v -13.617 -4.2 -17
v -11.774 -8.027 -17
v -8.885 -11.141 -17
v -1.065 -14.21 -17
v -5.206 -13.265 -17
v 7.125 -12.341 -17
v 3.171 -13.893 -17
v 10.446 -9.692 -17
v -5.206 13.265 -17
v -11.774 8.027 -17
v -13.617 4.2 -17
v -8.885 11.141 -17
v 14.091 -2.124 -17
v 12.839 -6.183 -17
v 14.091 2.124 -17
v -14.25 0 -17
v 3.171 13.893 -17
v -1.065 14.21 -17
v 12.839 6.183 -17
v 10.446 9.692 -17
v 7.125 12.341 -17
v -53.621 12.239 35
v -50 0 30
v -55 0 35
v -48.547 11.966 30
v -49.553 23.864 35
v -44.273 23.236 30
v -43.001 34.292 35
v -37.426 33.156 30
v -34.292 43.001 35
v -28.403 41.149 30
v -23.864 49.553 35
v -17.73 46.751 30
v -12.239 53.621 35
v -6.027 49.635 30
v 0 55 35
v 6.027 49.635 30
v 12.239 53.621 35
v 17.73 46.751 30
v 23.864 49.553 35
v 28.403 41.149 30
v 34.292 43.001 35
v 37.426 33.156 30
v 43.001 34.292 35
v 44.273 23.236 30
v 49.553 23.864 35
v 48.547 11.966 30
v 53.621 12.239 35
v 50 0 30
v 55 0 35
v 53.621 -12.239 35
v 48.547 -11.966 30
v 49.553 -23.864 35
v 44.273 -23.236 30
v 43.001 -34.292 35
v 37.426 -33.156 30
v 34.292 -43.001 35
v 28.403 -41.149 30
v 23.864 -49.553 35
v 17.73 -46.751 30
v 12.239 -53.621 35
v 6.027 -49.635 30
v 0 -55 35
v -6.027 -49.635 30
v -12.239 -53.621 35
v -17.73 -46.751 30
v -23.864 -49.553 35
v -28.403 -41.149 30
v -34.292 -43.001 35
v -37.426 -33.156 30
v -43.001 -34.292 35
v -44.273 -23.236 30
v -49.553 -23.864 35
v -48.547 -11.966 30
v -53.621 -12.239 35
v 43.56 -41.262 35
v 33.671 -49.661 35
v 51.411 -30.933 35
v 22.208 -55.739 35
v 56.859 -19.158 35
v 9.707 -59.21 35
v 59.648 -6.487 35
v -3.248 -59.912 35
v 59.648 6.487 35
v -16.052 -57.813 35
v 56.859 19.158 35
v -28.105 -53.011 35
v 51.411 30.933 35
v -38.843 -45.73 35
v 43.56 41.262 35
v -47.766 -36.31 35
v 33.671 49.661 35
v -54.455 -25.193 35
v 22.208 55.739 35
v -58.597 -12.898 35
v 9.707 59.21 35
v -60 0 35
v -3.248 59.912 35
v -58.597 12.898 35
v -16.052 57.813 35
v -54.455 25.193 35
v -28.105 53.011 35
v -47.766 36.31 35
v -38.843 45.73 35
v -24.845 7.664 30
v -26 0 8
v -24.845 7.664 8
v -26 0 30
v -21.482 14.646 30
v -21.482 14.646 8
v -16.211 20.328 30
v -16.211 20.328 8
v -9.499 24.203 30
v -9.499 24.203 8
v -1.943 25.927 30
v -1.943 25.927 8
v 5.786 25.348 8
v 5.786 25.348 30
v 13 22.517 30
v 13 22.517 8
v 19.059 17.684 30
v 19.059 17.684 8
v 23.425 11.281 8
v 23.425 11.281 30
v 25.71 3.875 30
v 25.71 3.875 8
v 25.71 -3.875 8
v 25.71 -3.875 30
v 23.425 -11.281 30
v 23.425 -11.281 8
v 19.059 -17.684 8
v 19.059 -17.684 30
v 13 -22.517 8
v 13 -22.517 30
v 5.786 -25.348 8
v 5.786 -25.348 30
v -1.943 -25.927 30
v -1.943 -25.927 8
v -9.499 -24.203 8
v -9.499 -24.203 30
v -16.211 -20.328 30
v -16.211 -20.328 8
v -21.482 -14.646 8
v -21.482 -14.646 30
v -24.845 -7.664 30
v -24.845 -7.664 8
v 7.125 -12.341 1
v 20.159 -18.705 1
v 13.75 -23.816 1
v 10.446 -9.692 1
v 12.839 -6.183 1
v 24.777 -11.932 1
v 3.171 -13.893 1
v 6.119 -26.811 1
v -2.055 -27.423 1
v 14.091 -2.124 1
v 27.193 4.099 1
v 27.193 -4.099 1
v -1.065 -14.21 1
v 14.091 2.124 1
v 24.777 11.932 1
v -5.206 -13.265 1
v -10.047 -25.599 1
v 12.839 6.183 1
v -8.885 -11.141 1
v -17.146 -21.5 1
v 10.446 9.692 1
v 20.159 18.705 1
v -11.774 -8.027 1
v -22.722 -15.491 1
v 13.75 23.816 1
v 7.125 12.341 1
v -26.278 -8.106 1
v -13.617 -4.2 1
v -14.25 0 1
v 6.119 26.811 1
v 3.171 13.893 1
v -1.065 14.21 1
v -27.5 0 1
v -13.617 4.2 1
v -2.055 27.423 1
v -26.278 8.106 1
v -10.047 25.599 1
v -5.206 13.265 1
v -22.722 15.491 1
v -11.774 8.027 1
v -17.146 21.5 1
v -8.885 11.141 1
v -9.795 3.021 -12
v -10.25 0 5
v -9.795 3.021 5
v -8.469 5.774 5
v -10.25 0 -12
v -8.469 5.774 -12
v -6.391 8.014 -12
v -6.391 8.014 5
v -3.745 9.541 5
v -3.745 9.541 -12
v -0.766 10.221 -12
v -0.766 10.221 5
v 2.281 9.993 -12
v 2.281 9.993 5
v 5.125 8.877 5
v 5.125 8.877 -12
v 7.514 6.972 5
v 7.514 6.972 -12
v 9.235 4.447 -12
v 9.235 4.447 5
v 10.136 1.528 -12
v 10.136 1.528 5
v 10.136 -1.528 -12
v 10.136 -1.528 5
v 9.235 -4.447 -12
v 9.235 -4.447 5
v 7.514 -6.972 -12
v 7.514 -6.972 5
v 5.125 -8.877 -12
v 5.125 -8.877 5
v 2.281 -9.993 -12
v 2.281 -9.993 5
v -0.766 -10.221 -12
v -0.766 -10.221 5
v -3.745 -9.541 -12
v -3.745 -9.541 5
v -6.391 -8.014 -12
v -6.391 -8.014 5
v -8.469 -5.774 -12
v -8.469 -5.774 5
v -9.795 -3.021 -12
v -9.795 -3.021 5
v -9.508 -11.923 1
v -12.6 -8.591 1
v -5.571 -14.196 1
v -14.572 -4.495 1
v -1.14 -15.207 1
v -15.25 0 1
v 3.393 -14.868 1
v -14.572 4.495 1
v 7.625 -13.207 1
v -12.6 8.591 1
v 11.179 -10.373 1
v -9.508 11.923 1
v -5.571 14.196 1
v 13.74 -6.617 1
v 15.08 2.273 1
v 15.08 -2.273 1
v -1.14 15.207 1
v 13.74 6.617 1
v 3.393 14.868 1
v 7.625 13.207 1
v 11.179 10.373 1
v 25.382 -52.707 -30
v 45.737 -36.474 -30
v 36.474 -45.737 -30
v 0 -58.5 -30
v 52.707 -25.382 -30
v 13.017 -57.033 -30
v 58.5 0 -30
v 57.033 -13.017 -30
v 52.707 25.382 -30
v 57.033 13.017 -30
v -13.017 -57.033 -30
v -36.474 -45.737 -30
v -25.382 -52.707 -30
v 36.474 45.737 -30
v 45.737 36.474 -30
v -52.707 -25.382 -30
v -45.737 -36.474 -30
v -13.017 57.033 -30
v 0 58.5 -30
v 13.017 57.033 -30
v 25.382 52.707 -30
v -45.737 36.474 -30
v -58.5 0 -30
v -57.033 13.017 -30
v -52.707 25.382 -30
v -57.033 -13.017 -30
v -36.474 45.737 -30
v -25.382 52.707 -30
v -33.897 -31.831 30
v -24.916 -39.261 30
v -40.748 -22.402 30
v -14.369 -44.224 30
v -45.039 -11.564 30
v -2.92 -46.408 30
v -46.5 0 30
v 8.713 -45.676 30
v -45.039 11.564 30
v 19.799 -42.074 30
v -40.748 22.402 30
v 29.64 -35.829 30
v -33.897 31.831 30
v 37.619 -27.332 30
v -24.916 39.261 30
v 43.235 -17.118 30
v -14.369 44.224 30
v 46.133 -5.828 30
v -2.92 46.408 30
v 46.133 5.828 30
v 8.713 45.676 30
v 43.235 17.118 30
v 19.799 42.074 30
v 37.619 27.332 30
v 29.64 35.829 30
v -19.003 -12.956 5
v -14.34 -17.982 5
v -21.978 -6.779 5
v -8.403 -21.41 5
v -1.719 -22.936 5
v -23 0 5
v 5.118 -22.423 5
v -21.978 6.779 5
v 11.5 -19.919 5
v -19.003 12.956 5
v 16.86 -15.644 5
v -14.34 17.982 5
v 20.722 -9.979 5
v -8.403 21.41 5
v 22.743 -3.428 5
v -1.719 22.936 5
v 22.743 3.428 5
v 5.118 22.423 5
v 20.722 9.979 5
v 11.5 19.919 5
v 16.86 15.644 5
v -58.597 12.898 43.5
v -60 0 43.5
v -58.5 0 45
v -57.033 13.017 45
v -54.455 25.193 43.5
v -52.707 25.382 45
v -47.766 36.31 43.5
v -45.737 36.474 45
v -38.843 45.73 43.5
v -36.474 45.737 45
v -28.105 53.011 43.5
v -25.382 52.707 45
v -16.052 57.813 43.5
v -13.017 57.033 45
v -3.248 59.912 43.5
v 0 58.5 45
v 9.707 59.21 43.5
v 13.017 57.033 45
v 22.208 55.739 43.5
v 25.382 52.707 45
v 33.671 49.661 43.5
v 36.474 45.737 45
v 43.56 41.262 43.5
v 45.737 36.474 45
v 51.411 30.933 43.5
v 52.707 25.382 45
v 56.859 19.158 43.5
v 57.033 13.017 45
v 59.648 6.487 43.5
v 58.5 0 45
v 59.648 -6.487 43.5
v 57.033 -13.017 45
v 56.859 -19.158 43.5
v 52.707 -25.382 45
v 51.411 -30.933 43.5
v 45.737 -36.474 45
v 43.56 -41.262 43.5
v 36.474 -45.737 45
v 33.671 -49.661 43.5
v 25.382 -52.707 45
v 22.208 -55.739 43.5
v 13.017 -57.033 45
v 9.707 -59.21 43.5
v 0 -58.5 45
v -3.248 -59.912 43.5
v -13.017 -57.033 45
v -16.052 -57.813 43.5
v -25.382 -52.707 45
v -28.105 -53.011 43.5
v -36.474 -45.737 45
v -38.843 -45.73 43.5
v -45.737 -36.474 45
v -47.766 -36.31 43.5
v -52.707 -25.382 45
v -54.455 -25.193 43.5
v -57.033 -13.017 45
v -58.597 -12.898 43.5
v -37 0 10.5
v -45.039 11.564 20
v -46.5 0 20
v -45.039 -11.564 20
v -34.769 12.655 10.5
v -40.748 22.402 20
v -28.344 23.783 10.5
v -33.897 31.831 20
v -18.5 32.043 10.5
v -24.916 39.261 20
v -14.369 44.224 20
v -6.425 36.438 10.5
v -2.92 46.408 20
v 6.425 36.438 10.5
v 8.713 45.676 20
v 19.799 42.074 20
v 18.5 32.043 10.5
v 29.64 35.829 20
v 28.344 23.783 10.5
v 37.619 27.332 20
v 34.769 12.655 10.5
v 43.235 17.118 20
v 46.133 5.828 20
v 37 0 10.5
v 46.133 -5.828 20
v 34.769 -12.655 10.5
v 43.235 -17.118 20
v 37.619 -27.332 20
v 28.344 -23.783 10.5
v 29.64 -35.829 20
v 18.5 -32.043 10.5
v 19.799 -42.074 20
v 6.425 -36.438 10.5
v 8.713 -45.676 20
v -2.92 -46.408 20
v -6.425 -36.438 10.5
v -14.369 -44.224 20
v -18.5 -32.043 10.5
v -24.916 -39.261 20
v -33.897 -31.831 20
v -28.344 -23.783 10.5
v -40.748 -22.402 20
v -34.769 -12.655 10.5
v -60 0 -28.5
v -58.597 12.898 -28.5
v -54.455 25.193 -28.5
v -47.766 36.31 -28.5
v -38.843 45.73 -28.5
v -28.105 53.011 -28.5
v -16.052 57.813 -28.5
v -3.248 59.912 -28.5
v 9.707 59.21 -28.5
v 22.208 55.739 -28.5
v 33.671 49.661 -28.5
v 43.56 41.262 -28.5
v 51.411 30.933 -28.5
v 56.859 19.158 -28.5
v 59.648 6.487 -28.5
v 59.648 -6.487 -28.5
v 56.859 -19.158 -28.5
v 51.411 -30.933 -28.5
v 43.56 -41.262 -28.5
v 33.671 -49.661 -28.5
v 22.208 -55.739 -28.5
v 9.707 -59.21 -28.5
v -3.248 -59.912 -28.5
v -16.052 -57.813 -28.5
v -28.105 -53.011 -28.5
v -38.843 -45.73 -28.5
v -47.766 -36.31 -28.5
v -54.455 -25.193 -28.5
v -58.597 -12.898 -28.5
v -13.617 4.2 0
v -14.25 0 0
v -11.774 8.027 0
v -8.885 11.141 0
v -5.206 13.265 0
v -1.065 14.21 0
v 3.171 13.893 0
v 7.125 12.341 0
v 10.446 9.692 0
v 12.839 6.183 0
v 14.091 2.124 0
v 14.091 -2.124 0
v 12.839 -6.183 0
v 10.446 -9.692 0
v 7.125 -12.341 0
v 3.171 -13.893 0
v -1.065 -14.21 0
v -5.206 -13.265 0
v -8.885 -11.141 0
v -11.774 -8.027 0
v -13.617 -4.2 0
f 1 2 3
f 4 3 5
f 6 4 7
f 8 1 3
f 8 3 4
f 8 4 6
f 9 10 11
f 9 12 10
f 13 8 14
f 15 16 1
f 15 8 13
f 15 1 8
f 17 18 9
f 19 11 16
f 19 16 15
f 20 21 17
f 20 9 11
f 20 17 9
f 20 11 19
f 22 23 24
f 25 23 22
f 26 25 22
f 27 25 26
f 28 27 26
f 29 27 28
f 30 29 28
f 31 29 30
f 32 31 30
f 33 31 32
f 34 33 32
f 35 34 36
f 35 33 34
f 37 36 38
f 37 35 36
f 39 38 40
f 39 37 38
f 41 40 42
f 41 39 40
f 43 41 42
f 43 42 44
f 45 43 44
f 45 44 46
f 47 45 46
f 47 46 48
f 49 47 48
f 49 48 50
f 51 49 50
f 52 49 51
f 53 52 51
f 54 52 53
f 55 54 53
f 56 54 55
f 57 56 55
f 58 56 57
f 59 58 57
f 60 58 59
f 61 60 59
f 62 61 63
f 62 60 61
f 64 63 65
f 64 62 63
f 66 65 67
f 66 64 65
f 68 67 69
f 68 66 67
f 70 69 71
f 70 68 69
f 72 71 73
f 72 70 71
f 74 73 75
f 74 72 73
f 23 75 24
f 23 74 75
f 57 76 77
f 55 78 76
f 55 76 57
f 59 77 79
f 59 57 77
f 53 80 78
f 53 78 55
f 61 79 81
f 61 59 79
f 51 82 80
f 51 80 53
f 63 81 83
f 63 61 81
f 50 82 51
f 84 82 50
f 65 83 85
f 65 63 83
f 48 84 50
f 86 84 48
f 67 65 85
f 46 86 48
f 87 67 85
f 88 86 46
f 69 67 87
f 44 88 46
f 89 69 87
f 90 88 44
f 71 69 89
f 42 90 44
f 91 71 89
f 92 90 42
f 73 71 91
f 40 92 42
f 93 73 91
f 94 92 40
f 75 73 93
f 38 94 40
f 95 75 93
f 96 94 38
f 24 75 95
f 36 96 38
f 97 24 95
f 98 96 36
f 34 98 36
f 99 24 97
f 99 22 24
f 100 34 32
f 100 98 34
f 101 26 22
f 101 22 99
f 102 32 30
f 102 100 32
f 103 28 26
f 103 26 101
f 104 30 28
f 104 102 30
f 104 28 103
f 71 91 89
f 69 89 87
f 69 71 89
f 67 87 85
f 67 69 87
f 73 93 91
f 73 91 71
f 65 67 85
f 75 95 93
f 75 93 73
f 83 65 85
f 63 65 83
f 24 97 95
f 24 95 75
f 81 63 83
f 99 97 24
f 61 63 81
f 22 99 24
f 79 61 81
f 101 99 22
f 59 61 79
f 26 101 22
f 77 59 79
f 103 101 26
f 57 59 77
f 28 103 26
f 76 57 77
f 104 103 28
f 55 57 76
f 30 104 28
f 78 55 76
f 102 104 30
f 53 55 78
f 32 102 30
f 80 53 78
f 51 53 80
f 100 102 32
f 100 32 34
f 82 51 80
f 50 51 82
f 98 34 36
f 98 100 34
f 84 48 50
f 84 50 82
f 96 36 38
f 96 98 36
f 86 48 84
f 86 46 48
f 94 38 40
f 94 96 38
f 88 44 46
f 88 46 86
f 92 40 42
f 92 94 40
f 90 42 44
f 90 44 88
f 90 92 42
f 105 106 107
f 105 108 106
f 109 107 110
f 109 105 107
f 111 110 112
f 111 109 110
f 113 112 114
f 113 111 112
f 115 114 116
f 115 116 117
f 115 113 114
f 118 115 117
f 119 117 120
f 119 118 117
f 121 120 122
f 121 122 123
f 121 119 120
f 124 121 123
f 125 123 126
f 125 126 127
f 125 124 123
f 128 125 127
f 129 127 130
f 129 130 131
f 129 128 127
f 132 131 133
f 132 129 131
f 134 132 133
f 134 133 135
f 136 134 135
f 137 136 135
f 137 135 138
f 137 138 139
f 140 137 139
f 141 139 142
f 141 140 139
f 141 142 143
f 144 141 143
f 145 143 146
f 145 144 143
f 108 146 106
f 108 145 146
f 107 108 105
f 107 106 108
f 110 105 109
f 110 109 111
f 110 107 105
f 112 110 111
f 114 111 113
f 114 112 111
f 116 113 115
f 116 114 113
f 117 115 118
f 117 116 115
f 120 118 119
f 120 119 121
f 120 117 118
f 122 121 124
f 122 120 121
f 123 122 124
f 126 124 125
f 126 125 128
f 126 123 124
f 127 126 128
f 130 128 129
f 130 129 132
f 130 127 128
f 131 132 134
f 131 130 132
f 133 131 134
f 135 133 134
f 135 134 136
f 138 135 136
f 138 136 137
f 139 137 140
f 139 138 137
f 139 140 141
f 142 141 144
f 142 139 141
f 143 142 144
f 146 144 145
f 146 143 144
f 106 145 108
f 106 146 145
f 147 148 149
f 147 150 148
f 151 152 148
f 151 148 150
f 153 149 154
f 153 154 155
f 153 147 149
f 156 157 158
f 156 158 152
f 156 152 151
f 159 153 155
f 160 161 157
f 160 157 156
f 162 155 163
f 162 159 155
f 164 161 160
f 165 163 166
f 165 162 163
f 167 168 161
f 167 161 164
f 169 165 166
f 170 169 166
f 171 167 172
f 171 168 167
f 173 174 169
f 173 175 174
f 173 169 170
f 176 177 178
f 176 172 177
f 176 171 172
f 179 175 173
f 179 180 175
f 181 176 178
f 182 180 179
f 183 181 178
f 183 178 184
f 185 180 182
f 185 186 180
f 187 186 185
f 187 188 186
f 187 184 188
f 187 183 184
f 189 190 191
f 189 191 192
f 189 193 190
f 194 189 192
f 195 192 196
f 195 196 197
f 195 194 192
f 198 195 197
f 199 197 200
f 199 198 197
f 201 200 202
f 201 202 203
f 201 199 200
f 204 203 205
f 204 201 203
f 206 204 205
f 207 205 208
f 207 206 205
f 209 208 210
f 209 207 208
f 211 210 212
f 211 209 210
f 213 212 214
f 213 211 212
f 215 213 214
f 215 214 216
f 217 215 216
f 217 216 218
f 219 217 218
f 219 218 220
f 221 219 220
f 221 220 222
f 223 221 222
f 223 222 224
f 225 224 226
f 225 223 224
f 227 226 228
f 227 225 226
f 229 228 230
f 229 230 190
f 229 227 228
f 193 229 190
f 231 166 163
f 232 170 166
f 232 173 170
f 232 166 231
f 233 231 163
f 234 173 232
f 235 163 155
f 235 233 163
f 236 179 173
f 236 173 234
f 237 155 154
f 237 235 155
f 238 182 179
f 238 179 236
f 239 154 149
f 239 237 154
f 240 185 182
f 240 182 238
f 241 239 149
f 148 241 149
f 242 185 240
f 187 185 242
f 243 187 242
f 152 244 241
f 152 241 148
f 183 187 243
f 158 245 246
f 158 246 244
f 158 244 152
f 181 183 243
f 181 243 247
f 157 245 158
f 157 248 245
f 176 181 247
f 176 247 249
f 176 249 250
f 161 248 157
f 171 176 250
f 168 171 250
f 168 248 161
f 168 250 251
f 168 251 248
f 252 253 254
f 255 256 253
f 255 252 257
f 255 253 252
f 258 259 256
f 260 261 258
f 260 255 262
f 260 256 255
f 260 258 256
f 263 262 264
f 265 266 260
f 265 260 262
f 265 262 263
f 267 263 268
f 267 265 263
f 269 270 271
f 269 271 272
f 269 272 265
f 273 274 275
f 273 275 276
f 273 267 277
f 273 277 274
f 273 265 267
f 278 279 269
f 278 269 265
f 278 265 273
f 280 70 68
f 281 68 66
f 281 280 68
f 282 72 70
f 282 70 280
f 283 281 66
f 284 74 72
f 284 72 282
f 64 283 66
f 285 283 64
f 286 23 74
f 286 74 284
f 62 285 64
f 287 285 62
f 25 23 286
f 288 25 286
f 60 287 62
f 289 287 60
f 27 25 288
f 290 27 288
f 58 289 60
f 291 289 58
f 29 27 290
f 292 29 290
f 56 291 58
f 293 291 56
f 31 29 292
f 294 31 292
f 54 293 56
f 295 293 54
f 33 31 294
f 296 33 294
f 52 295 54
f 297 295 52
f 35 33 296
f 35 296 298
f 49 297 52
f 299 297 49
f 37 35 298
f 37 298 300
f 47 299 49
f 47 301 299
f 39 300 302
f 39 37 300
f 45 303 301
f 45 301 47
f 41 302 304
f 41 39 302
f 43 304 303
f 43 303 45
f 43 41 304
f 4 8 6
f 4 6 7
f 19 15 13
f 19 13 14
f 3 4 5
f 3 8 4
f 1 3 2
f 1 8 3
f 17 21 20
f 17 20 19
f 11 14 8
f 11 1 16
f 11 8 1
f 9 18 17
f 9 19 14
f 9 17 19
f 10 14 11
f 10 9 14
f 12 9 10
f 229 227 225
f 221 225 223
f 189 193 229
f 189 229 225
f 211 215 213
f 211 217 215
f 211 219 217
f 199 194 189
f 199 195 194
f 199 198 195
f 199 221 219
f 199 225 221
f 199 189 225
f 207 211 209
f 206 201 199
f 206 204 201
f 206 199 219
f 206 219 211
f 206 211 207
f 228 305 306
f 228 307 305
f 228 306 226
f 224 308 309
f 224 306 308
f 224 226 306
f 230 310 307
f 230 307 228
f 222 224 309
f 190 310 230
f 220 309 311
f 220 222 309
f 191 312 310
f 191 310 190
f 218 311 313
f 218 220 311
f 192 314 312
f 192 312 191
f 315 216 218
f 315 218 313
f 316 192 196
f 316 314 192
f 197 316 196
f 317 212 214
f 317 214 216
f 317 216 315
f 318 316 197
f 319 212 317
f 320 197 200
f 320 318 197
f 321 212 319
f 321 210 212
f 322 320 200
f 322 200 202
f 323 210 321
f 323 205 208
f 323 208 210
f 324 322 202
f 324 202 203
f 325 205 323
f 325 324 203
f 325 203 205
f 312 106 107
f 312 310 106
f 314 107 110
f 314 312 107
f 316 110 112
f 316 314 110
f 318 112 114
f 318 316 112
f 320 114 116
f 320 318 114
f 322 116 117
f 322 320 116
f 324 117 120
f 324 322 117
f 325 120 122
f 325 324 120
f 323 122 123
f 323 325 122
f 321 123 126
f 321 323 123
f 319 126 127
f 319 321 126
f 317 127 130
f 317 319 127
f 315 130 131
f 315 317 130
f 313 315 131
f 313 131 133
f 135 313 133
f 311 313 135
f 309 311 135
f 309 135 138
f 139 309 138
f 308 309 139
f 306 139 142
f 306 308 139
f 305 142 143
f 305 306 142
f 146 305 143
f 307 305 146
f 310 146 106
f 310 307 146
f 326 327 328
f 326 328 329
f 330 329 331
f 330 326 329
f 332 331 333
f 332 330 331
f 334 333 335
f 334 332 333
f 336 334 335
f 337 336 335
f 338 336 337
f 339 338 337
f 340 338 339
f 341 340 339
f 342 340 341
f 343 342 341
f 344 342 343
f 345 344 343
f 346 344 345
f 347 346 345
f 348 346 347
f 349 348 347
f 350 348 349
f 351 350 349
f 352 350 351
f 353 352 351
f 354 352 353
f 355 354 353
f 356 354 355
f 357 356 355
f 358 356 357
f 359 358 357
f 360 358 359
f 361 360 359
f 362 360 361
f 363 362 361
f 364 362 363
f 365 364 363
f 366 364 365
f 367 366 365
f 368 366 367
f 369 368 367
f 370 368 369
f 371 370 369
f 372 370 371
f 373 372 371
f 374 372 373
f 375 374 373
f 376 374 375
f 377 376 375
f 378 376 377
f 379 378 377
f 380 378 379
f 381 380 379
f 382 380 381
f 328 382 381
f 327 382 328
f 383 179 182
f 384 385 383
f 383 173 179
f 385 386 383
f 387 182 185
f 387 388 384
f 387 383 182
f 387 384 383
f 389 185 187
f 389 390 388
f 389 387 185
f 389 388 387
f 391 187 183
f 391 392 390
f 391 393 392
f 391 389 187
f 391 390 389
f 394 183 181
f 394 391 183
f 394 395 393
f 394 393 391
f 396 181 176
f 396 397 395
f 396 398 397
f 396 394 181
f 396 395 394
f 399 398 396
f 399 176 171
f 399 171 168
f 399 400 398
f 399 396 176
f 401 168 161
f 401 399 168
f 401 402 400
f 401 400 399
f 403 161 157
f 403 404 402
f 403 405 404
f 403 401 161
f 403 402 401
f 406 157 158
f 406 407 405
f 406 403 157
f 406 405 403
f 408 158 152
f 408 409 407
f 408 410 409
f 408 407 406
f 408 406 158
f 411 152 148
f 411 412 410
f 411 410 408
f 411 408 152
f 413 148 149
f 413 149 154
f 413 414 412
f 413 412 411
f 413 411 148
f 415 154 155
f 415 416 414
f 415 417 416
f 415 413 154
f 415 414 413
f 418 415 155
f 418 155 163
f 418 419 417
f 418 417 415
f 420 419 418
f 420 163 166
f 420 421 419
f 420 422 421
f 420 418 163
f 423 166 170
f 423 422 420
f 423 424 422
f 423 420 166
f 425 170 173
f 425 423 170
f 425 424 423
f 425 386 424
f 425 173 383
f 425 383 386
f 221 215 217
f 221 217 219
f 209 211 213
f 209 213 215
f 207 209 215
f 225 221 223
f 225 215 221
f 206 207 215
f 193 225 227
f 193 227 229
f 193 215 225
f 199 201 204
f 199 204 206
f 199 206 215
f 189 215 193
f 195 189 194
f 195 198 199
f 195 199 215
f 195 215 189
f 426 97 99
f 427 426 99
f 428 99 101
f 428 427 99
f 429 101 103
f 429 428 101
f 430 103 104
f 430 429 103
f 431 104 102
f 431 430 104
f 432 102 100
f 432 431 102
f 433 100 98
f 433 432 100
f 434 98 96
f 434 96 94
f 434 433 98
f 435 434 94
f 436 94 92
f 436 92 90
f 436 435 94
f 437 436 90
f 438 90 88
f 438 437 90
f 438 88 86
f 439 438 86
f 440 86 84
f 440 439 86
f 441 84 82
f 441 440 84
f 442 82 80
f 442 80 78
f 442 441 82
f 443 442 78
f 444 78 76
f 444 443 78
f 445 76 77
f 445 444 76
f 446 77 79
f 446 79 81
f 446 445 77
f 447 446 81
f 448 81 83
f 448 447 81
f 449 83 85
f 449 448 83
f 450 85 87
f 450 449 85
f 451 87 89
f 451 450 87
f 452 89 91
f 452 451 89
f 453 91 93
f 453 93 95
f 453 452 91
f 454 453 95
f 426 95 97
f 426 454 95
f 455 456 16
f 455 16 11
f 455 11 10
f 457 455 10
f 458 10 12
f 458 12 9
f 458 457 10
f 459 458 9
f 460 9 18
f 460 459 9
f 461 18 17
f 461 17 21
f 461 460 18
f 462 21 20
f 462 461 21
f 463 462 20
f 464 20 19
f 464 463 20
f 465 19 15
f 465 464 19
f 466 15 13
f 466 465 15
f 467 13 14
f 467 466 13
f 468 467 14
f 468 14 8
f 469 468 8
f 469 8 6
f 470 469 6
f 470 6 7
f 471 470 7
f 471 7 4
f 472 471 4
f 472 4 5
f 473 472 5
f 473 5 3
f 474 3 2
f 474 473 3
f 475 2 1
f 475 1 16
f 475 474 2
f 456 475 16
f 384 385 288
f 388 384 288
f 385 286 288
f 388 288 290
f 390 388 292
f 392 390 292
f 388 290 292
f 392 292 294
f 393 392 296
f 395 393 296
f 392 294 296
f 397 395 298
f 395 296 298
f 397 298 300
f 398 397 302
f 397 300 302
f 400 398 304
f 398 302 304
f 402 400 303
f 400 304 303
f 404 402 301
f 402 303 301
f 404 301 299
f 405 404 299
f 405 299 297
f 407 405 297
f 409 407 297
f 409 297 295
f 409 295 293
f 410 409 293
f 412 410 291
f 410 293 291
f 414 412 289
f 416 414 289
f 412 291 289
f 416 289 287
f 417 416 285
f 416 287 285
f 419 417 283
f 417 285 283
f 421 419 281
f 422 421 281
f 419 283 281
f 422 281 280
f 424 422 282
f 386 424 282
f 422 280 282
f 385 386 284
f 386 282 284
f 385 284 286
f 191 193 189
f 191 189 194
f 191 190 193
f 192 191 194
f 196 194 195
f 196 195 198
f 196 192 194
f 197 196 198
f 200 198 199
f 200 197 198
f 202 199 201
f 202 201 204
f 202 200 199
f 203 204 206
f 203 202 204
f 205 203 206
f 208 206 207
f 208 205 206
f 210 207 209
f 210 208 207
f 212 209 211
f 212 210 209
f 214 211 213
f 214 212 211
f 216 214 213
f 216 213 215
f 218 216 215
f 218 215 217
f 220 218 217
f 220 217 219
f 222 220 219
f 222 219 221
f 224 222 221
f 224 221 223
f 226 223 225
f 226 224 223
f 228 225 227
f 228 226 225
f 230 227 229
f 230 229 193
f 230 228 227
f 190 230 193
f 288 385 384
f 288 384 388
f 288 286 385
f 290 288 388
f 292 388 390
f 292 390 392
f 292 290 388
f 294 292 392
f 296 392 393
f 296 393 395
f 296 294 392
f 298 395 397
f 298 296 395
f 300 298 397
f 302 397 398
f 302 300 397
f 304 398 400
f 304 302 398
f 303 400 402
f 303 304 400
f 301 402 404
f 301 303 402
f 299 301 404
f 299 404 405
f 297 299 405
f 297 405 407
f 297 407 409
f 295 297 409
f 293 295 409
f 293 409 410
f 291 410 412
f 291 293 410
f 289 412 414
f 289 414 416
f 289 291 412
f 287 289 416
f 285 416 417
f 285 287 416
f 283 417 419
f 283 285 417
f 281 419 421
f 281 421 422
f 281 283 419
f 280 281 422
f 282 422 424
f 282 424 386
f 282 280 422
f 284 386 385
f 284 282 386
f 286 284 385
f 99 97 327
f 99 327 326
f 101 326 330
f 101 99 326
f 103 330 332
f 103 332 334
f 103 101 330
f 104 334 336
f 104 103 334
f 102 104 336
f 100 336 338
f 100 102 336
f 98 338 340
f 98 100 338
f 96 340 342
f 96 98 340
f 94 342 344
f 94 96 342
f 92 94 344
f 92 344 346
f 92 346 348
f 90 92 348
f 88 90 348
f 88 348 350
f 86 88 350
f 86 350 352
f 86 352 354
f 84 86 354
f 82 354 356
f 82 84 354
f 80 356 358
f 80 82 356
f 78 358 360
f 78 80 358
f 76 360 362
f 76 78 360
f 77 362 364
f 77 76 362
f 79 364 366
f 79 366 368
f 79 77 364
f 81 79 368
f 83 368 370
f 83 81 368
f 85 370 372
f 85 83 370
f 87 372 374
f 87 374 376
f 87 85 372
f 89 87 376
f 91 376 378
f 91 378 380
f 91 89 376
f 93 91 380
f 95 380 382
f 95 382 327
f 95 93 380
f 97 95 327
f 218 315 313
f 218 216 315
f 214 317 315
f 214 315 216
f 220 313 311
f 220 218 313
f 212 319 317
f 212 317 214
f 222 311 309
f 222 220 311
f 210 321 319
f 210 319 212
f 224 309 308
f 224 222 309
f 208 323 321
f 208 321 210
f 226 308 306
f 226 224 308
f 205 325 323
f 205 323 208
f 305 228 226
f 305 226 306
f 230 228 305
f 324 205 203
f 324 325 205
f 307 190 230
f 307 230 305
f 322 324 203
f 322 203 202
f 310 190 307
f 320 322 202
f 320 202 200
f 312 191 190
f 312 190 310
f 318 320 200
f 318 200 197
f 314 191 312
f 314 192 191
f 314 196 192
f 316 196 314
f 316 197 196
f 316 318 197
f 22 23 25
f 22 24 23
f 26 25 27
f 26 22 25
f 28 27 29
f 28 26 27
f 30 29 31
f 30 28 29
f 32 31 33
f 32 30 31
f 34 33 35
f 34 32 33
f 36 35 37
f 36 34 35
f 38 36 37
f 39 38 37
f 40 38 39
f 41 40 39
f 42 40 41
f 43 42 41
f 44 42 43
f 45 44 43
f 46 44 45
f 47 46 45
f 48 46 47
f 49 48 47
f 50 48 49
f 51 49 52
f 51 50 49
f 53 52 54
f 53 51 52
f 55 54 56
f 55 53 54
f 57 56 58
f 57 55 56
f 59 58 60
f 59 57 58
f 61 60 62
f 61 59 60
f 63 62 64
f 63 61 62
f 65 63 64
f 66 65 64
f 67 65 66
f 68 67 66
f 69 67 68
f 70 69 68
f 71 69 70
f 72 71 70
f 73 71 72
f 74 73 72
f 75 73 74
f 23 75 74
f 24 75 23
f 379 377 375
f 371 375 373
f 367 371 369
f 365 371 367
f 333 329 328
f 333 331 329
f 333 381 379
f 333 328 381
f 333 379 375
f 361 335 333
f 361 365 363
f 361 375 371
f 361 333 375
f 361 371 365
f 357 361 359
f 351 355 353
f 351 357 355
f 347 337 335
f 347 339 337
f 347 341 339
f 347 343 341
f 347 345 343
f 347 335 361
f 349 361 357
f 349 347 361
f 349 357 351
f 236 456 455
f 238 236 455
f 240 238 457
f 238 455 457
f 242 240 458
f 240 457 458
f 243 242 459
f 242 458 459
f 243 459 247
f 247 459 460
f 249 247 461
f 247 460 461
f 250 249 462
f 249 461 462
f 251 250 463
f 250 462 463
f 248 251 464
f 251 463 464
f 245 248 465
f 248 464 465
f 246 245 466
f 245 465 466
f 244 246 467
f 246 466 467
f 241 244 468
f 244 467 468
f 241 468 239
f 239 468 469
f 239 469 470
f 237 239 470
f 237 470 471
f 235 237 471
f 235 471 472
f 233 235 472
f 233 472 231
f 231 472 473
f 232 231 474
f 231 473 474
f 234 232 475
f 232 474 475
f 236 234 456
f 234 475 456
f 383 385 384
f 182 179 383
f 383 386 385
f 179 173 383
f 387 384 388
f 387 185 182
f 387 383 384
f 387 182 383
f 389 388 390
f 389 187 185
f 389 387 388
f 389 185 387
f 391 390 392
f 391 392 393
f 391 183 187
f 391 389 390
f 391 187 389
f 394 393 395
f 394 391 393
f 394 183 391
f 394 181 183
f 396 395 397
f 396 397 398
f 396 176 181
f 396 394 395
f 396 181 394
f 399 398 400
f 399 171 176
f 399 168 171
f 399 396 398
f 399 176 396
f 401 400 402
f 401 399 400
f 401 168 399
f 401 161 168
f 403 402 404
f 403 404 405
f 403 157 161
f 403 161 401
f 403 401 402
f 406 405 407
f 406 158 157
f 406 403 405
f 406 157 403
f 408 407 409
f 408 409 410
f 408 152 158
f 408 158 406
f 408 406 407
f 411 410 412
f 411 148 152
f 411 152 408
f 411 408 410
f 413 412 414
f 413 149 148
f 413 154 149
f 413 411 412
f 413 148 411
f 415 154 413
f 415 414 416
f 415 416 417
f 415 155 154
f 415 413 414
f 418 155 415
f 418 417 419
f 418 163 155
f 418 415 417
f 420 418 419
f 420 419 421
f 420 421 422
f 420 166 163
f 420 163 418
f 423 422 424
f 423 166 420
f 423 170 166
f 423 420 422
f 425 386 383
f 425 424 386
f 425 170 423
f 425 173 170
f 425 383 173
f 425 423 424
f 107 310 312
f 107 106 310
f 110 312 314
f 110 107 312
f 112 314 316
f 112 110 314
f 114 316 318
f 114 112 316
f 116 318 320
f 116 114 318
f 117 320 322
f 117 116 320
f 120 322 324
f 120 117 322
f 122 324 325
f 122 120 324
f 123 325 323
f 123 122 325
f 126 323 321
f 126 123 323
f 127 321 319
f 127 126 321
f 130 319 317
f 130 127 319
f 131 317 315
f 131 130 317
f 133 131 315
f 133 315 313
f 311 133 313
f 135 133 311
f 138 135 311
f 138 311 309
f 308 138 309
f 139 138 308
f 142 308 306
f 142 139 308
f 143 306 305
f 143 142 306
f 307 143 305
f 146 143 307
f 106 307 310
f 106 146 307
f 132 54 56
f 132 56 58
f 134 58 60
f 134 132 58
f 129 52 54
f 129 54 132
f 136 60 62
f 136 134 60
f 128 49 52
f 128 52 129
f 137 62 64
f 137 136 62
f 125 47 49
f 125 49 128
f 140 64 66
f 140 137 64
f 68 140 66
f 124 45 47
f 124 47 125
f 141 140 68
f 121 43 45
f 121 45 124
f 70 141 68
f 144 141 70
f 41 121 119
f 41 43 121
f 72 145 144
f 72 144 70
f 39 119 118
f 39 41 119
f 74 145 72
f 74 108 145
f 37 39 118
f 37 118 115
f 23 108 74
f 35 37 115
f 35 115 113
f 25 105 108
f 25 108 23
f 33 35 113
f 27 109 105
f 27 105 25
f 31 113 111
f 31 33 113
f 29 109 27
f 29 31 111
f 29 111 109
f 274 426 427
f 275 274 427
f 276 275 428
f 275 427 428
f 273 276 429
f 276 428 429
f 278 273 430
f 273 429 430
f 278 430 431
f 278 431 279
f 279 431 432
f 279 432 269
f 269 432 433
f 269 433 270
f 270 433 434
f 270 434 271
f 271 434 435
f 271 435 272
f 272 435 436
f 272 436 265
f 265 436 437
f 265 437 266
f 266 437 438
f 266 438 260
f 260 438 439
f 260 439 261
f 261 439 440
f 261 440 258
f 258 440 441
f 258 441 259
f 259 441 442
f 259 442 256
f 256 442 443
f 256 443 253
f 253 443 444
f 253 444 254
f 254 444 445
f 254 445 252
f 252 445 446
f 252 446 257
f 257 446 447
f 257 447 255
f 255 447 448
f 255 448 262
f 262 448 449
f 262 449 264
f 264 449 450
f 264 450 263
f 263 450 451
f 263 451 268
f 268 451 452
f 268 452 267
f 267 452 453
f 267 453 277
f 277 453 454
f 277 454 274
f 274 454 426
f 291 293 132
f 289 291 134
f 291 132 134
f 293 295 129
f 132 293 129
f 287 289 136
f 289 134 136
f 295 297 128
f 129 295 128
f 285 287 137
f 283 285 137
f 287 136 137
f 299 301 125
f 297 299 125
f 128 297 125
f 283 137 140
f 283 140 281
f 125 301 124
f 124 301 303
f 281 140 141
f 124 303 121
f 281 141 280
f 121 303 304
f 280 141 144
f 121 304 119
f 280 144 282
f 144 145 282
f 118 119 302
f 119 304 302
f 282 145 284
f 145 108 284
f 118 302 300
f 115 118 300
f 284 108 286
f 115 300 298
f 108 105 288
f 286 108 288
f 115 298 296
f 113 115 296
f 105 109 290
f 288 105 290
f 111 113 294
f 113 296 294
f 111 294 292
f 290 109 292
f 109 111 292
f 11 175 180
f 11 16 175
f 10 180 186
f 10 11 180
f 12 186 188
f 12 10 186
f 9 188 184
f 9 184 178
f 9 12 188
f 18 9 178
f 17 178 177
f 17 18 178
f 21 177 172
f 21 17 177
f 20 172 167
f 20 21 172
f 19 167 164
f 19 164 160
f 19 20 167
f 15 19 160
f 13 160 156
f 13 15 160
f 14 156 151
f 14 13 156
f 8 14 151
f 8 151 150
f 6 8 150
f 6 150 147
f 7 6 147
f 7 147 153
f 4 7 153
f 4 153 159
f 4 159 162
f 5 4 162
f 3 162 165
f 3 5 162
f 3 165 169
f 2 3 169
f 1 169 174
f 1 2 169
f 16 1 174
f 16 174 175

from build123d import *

# Parameters (mm, degrees)
F0_W    = 26
F0_H    = 10
F0_W_2  = 20.5
F4_SIZE = 1.5
F5_SIZE = 1.5
F6_SIZE = 1


with BuildPart() as f1:
    # F0 (on Front) → F1 (revolve)
    with BuildSketch(Plane.XZ):
        Polygon((-60, 30), (-60, 20), (-46.5, 20), (-46.5, 30), (-50, 30), align=None)
        Polygon((-60, -30), (0, -30), (0, -17), (-14.25, -17), (-14.25, 1), (-27.5, 1), (-46.5, 20), (-60, 20), align=None)
        Polygon((-55, 35), (-60, 35), (-60, 30), (-50, 30), align=None)
    revolve(axis=Axis((0, 0, 13.6922076344), (0, 0, -1)))

    # F5
    f5_edges = [f1.edges().sort_by_distance(p)[0] for p in [
        (60, 0, -30),
    ]]
    chamfer(f5_edges, length=F5_SIZE)

    # F6
    f6_edges = [f1.edges().sort_by_distance(p)[0] for p in [
        (14.25, 0, 1),
    ]]
    chamfer(f6_edges, length=F6_SIZE)


with BuildPart() as f2:
    # F0 (on Front) → F2 (revolve)
    with BuildSketch(Plane.XZ):
        with Locations((-13, 25)):
            Rectangle(F0_W, F0_H)
        Polygon((0, -12), (0, 20), (-26, 20), (-26, 8), (-23, 5), (-10.25, 5), (-10.25, -12), align=None)
        Polygon((0, 30), (0, 45), (-60, 45), (-60, 35), (-55, 35), (-50, 30), (-46.5, 30), (-26, 30), align=None)
    revolve(axis=Axis((0, 0, 13.6922076344), (0, 0, -1)))

    # F4
    f4_edges = [f2.edges().sort_by_distance(p)[0] for p in [
        (60, 0, 45),
    ]]
    chamfer(f4_edges, length=F4_SIZE)


with BuildPart() as f3:
    # F0 (on Front) → F3 (revolve)
    with BuildSketch(Plane.XZ):
        with Locations((-36.25, 25)):
            Rectangle(F0_W_2, F0_H)
        Polygon((-14.25, -17), (0, -17), (0, -12), (-10.25, -12), (-10.25, 5), (-23, 5), (-26, 8), (-26, 20), (-46.5, 20), (-27.5, 1), (-14.25, 1), align=None)
    revolve(axis=Axis((0, 0, 13.6922076344), (0, 0, -1)))


solid = Compound([f1.part, f2.part, f3.part])
